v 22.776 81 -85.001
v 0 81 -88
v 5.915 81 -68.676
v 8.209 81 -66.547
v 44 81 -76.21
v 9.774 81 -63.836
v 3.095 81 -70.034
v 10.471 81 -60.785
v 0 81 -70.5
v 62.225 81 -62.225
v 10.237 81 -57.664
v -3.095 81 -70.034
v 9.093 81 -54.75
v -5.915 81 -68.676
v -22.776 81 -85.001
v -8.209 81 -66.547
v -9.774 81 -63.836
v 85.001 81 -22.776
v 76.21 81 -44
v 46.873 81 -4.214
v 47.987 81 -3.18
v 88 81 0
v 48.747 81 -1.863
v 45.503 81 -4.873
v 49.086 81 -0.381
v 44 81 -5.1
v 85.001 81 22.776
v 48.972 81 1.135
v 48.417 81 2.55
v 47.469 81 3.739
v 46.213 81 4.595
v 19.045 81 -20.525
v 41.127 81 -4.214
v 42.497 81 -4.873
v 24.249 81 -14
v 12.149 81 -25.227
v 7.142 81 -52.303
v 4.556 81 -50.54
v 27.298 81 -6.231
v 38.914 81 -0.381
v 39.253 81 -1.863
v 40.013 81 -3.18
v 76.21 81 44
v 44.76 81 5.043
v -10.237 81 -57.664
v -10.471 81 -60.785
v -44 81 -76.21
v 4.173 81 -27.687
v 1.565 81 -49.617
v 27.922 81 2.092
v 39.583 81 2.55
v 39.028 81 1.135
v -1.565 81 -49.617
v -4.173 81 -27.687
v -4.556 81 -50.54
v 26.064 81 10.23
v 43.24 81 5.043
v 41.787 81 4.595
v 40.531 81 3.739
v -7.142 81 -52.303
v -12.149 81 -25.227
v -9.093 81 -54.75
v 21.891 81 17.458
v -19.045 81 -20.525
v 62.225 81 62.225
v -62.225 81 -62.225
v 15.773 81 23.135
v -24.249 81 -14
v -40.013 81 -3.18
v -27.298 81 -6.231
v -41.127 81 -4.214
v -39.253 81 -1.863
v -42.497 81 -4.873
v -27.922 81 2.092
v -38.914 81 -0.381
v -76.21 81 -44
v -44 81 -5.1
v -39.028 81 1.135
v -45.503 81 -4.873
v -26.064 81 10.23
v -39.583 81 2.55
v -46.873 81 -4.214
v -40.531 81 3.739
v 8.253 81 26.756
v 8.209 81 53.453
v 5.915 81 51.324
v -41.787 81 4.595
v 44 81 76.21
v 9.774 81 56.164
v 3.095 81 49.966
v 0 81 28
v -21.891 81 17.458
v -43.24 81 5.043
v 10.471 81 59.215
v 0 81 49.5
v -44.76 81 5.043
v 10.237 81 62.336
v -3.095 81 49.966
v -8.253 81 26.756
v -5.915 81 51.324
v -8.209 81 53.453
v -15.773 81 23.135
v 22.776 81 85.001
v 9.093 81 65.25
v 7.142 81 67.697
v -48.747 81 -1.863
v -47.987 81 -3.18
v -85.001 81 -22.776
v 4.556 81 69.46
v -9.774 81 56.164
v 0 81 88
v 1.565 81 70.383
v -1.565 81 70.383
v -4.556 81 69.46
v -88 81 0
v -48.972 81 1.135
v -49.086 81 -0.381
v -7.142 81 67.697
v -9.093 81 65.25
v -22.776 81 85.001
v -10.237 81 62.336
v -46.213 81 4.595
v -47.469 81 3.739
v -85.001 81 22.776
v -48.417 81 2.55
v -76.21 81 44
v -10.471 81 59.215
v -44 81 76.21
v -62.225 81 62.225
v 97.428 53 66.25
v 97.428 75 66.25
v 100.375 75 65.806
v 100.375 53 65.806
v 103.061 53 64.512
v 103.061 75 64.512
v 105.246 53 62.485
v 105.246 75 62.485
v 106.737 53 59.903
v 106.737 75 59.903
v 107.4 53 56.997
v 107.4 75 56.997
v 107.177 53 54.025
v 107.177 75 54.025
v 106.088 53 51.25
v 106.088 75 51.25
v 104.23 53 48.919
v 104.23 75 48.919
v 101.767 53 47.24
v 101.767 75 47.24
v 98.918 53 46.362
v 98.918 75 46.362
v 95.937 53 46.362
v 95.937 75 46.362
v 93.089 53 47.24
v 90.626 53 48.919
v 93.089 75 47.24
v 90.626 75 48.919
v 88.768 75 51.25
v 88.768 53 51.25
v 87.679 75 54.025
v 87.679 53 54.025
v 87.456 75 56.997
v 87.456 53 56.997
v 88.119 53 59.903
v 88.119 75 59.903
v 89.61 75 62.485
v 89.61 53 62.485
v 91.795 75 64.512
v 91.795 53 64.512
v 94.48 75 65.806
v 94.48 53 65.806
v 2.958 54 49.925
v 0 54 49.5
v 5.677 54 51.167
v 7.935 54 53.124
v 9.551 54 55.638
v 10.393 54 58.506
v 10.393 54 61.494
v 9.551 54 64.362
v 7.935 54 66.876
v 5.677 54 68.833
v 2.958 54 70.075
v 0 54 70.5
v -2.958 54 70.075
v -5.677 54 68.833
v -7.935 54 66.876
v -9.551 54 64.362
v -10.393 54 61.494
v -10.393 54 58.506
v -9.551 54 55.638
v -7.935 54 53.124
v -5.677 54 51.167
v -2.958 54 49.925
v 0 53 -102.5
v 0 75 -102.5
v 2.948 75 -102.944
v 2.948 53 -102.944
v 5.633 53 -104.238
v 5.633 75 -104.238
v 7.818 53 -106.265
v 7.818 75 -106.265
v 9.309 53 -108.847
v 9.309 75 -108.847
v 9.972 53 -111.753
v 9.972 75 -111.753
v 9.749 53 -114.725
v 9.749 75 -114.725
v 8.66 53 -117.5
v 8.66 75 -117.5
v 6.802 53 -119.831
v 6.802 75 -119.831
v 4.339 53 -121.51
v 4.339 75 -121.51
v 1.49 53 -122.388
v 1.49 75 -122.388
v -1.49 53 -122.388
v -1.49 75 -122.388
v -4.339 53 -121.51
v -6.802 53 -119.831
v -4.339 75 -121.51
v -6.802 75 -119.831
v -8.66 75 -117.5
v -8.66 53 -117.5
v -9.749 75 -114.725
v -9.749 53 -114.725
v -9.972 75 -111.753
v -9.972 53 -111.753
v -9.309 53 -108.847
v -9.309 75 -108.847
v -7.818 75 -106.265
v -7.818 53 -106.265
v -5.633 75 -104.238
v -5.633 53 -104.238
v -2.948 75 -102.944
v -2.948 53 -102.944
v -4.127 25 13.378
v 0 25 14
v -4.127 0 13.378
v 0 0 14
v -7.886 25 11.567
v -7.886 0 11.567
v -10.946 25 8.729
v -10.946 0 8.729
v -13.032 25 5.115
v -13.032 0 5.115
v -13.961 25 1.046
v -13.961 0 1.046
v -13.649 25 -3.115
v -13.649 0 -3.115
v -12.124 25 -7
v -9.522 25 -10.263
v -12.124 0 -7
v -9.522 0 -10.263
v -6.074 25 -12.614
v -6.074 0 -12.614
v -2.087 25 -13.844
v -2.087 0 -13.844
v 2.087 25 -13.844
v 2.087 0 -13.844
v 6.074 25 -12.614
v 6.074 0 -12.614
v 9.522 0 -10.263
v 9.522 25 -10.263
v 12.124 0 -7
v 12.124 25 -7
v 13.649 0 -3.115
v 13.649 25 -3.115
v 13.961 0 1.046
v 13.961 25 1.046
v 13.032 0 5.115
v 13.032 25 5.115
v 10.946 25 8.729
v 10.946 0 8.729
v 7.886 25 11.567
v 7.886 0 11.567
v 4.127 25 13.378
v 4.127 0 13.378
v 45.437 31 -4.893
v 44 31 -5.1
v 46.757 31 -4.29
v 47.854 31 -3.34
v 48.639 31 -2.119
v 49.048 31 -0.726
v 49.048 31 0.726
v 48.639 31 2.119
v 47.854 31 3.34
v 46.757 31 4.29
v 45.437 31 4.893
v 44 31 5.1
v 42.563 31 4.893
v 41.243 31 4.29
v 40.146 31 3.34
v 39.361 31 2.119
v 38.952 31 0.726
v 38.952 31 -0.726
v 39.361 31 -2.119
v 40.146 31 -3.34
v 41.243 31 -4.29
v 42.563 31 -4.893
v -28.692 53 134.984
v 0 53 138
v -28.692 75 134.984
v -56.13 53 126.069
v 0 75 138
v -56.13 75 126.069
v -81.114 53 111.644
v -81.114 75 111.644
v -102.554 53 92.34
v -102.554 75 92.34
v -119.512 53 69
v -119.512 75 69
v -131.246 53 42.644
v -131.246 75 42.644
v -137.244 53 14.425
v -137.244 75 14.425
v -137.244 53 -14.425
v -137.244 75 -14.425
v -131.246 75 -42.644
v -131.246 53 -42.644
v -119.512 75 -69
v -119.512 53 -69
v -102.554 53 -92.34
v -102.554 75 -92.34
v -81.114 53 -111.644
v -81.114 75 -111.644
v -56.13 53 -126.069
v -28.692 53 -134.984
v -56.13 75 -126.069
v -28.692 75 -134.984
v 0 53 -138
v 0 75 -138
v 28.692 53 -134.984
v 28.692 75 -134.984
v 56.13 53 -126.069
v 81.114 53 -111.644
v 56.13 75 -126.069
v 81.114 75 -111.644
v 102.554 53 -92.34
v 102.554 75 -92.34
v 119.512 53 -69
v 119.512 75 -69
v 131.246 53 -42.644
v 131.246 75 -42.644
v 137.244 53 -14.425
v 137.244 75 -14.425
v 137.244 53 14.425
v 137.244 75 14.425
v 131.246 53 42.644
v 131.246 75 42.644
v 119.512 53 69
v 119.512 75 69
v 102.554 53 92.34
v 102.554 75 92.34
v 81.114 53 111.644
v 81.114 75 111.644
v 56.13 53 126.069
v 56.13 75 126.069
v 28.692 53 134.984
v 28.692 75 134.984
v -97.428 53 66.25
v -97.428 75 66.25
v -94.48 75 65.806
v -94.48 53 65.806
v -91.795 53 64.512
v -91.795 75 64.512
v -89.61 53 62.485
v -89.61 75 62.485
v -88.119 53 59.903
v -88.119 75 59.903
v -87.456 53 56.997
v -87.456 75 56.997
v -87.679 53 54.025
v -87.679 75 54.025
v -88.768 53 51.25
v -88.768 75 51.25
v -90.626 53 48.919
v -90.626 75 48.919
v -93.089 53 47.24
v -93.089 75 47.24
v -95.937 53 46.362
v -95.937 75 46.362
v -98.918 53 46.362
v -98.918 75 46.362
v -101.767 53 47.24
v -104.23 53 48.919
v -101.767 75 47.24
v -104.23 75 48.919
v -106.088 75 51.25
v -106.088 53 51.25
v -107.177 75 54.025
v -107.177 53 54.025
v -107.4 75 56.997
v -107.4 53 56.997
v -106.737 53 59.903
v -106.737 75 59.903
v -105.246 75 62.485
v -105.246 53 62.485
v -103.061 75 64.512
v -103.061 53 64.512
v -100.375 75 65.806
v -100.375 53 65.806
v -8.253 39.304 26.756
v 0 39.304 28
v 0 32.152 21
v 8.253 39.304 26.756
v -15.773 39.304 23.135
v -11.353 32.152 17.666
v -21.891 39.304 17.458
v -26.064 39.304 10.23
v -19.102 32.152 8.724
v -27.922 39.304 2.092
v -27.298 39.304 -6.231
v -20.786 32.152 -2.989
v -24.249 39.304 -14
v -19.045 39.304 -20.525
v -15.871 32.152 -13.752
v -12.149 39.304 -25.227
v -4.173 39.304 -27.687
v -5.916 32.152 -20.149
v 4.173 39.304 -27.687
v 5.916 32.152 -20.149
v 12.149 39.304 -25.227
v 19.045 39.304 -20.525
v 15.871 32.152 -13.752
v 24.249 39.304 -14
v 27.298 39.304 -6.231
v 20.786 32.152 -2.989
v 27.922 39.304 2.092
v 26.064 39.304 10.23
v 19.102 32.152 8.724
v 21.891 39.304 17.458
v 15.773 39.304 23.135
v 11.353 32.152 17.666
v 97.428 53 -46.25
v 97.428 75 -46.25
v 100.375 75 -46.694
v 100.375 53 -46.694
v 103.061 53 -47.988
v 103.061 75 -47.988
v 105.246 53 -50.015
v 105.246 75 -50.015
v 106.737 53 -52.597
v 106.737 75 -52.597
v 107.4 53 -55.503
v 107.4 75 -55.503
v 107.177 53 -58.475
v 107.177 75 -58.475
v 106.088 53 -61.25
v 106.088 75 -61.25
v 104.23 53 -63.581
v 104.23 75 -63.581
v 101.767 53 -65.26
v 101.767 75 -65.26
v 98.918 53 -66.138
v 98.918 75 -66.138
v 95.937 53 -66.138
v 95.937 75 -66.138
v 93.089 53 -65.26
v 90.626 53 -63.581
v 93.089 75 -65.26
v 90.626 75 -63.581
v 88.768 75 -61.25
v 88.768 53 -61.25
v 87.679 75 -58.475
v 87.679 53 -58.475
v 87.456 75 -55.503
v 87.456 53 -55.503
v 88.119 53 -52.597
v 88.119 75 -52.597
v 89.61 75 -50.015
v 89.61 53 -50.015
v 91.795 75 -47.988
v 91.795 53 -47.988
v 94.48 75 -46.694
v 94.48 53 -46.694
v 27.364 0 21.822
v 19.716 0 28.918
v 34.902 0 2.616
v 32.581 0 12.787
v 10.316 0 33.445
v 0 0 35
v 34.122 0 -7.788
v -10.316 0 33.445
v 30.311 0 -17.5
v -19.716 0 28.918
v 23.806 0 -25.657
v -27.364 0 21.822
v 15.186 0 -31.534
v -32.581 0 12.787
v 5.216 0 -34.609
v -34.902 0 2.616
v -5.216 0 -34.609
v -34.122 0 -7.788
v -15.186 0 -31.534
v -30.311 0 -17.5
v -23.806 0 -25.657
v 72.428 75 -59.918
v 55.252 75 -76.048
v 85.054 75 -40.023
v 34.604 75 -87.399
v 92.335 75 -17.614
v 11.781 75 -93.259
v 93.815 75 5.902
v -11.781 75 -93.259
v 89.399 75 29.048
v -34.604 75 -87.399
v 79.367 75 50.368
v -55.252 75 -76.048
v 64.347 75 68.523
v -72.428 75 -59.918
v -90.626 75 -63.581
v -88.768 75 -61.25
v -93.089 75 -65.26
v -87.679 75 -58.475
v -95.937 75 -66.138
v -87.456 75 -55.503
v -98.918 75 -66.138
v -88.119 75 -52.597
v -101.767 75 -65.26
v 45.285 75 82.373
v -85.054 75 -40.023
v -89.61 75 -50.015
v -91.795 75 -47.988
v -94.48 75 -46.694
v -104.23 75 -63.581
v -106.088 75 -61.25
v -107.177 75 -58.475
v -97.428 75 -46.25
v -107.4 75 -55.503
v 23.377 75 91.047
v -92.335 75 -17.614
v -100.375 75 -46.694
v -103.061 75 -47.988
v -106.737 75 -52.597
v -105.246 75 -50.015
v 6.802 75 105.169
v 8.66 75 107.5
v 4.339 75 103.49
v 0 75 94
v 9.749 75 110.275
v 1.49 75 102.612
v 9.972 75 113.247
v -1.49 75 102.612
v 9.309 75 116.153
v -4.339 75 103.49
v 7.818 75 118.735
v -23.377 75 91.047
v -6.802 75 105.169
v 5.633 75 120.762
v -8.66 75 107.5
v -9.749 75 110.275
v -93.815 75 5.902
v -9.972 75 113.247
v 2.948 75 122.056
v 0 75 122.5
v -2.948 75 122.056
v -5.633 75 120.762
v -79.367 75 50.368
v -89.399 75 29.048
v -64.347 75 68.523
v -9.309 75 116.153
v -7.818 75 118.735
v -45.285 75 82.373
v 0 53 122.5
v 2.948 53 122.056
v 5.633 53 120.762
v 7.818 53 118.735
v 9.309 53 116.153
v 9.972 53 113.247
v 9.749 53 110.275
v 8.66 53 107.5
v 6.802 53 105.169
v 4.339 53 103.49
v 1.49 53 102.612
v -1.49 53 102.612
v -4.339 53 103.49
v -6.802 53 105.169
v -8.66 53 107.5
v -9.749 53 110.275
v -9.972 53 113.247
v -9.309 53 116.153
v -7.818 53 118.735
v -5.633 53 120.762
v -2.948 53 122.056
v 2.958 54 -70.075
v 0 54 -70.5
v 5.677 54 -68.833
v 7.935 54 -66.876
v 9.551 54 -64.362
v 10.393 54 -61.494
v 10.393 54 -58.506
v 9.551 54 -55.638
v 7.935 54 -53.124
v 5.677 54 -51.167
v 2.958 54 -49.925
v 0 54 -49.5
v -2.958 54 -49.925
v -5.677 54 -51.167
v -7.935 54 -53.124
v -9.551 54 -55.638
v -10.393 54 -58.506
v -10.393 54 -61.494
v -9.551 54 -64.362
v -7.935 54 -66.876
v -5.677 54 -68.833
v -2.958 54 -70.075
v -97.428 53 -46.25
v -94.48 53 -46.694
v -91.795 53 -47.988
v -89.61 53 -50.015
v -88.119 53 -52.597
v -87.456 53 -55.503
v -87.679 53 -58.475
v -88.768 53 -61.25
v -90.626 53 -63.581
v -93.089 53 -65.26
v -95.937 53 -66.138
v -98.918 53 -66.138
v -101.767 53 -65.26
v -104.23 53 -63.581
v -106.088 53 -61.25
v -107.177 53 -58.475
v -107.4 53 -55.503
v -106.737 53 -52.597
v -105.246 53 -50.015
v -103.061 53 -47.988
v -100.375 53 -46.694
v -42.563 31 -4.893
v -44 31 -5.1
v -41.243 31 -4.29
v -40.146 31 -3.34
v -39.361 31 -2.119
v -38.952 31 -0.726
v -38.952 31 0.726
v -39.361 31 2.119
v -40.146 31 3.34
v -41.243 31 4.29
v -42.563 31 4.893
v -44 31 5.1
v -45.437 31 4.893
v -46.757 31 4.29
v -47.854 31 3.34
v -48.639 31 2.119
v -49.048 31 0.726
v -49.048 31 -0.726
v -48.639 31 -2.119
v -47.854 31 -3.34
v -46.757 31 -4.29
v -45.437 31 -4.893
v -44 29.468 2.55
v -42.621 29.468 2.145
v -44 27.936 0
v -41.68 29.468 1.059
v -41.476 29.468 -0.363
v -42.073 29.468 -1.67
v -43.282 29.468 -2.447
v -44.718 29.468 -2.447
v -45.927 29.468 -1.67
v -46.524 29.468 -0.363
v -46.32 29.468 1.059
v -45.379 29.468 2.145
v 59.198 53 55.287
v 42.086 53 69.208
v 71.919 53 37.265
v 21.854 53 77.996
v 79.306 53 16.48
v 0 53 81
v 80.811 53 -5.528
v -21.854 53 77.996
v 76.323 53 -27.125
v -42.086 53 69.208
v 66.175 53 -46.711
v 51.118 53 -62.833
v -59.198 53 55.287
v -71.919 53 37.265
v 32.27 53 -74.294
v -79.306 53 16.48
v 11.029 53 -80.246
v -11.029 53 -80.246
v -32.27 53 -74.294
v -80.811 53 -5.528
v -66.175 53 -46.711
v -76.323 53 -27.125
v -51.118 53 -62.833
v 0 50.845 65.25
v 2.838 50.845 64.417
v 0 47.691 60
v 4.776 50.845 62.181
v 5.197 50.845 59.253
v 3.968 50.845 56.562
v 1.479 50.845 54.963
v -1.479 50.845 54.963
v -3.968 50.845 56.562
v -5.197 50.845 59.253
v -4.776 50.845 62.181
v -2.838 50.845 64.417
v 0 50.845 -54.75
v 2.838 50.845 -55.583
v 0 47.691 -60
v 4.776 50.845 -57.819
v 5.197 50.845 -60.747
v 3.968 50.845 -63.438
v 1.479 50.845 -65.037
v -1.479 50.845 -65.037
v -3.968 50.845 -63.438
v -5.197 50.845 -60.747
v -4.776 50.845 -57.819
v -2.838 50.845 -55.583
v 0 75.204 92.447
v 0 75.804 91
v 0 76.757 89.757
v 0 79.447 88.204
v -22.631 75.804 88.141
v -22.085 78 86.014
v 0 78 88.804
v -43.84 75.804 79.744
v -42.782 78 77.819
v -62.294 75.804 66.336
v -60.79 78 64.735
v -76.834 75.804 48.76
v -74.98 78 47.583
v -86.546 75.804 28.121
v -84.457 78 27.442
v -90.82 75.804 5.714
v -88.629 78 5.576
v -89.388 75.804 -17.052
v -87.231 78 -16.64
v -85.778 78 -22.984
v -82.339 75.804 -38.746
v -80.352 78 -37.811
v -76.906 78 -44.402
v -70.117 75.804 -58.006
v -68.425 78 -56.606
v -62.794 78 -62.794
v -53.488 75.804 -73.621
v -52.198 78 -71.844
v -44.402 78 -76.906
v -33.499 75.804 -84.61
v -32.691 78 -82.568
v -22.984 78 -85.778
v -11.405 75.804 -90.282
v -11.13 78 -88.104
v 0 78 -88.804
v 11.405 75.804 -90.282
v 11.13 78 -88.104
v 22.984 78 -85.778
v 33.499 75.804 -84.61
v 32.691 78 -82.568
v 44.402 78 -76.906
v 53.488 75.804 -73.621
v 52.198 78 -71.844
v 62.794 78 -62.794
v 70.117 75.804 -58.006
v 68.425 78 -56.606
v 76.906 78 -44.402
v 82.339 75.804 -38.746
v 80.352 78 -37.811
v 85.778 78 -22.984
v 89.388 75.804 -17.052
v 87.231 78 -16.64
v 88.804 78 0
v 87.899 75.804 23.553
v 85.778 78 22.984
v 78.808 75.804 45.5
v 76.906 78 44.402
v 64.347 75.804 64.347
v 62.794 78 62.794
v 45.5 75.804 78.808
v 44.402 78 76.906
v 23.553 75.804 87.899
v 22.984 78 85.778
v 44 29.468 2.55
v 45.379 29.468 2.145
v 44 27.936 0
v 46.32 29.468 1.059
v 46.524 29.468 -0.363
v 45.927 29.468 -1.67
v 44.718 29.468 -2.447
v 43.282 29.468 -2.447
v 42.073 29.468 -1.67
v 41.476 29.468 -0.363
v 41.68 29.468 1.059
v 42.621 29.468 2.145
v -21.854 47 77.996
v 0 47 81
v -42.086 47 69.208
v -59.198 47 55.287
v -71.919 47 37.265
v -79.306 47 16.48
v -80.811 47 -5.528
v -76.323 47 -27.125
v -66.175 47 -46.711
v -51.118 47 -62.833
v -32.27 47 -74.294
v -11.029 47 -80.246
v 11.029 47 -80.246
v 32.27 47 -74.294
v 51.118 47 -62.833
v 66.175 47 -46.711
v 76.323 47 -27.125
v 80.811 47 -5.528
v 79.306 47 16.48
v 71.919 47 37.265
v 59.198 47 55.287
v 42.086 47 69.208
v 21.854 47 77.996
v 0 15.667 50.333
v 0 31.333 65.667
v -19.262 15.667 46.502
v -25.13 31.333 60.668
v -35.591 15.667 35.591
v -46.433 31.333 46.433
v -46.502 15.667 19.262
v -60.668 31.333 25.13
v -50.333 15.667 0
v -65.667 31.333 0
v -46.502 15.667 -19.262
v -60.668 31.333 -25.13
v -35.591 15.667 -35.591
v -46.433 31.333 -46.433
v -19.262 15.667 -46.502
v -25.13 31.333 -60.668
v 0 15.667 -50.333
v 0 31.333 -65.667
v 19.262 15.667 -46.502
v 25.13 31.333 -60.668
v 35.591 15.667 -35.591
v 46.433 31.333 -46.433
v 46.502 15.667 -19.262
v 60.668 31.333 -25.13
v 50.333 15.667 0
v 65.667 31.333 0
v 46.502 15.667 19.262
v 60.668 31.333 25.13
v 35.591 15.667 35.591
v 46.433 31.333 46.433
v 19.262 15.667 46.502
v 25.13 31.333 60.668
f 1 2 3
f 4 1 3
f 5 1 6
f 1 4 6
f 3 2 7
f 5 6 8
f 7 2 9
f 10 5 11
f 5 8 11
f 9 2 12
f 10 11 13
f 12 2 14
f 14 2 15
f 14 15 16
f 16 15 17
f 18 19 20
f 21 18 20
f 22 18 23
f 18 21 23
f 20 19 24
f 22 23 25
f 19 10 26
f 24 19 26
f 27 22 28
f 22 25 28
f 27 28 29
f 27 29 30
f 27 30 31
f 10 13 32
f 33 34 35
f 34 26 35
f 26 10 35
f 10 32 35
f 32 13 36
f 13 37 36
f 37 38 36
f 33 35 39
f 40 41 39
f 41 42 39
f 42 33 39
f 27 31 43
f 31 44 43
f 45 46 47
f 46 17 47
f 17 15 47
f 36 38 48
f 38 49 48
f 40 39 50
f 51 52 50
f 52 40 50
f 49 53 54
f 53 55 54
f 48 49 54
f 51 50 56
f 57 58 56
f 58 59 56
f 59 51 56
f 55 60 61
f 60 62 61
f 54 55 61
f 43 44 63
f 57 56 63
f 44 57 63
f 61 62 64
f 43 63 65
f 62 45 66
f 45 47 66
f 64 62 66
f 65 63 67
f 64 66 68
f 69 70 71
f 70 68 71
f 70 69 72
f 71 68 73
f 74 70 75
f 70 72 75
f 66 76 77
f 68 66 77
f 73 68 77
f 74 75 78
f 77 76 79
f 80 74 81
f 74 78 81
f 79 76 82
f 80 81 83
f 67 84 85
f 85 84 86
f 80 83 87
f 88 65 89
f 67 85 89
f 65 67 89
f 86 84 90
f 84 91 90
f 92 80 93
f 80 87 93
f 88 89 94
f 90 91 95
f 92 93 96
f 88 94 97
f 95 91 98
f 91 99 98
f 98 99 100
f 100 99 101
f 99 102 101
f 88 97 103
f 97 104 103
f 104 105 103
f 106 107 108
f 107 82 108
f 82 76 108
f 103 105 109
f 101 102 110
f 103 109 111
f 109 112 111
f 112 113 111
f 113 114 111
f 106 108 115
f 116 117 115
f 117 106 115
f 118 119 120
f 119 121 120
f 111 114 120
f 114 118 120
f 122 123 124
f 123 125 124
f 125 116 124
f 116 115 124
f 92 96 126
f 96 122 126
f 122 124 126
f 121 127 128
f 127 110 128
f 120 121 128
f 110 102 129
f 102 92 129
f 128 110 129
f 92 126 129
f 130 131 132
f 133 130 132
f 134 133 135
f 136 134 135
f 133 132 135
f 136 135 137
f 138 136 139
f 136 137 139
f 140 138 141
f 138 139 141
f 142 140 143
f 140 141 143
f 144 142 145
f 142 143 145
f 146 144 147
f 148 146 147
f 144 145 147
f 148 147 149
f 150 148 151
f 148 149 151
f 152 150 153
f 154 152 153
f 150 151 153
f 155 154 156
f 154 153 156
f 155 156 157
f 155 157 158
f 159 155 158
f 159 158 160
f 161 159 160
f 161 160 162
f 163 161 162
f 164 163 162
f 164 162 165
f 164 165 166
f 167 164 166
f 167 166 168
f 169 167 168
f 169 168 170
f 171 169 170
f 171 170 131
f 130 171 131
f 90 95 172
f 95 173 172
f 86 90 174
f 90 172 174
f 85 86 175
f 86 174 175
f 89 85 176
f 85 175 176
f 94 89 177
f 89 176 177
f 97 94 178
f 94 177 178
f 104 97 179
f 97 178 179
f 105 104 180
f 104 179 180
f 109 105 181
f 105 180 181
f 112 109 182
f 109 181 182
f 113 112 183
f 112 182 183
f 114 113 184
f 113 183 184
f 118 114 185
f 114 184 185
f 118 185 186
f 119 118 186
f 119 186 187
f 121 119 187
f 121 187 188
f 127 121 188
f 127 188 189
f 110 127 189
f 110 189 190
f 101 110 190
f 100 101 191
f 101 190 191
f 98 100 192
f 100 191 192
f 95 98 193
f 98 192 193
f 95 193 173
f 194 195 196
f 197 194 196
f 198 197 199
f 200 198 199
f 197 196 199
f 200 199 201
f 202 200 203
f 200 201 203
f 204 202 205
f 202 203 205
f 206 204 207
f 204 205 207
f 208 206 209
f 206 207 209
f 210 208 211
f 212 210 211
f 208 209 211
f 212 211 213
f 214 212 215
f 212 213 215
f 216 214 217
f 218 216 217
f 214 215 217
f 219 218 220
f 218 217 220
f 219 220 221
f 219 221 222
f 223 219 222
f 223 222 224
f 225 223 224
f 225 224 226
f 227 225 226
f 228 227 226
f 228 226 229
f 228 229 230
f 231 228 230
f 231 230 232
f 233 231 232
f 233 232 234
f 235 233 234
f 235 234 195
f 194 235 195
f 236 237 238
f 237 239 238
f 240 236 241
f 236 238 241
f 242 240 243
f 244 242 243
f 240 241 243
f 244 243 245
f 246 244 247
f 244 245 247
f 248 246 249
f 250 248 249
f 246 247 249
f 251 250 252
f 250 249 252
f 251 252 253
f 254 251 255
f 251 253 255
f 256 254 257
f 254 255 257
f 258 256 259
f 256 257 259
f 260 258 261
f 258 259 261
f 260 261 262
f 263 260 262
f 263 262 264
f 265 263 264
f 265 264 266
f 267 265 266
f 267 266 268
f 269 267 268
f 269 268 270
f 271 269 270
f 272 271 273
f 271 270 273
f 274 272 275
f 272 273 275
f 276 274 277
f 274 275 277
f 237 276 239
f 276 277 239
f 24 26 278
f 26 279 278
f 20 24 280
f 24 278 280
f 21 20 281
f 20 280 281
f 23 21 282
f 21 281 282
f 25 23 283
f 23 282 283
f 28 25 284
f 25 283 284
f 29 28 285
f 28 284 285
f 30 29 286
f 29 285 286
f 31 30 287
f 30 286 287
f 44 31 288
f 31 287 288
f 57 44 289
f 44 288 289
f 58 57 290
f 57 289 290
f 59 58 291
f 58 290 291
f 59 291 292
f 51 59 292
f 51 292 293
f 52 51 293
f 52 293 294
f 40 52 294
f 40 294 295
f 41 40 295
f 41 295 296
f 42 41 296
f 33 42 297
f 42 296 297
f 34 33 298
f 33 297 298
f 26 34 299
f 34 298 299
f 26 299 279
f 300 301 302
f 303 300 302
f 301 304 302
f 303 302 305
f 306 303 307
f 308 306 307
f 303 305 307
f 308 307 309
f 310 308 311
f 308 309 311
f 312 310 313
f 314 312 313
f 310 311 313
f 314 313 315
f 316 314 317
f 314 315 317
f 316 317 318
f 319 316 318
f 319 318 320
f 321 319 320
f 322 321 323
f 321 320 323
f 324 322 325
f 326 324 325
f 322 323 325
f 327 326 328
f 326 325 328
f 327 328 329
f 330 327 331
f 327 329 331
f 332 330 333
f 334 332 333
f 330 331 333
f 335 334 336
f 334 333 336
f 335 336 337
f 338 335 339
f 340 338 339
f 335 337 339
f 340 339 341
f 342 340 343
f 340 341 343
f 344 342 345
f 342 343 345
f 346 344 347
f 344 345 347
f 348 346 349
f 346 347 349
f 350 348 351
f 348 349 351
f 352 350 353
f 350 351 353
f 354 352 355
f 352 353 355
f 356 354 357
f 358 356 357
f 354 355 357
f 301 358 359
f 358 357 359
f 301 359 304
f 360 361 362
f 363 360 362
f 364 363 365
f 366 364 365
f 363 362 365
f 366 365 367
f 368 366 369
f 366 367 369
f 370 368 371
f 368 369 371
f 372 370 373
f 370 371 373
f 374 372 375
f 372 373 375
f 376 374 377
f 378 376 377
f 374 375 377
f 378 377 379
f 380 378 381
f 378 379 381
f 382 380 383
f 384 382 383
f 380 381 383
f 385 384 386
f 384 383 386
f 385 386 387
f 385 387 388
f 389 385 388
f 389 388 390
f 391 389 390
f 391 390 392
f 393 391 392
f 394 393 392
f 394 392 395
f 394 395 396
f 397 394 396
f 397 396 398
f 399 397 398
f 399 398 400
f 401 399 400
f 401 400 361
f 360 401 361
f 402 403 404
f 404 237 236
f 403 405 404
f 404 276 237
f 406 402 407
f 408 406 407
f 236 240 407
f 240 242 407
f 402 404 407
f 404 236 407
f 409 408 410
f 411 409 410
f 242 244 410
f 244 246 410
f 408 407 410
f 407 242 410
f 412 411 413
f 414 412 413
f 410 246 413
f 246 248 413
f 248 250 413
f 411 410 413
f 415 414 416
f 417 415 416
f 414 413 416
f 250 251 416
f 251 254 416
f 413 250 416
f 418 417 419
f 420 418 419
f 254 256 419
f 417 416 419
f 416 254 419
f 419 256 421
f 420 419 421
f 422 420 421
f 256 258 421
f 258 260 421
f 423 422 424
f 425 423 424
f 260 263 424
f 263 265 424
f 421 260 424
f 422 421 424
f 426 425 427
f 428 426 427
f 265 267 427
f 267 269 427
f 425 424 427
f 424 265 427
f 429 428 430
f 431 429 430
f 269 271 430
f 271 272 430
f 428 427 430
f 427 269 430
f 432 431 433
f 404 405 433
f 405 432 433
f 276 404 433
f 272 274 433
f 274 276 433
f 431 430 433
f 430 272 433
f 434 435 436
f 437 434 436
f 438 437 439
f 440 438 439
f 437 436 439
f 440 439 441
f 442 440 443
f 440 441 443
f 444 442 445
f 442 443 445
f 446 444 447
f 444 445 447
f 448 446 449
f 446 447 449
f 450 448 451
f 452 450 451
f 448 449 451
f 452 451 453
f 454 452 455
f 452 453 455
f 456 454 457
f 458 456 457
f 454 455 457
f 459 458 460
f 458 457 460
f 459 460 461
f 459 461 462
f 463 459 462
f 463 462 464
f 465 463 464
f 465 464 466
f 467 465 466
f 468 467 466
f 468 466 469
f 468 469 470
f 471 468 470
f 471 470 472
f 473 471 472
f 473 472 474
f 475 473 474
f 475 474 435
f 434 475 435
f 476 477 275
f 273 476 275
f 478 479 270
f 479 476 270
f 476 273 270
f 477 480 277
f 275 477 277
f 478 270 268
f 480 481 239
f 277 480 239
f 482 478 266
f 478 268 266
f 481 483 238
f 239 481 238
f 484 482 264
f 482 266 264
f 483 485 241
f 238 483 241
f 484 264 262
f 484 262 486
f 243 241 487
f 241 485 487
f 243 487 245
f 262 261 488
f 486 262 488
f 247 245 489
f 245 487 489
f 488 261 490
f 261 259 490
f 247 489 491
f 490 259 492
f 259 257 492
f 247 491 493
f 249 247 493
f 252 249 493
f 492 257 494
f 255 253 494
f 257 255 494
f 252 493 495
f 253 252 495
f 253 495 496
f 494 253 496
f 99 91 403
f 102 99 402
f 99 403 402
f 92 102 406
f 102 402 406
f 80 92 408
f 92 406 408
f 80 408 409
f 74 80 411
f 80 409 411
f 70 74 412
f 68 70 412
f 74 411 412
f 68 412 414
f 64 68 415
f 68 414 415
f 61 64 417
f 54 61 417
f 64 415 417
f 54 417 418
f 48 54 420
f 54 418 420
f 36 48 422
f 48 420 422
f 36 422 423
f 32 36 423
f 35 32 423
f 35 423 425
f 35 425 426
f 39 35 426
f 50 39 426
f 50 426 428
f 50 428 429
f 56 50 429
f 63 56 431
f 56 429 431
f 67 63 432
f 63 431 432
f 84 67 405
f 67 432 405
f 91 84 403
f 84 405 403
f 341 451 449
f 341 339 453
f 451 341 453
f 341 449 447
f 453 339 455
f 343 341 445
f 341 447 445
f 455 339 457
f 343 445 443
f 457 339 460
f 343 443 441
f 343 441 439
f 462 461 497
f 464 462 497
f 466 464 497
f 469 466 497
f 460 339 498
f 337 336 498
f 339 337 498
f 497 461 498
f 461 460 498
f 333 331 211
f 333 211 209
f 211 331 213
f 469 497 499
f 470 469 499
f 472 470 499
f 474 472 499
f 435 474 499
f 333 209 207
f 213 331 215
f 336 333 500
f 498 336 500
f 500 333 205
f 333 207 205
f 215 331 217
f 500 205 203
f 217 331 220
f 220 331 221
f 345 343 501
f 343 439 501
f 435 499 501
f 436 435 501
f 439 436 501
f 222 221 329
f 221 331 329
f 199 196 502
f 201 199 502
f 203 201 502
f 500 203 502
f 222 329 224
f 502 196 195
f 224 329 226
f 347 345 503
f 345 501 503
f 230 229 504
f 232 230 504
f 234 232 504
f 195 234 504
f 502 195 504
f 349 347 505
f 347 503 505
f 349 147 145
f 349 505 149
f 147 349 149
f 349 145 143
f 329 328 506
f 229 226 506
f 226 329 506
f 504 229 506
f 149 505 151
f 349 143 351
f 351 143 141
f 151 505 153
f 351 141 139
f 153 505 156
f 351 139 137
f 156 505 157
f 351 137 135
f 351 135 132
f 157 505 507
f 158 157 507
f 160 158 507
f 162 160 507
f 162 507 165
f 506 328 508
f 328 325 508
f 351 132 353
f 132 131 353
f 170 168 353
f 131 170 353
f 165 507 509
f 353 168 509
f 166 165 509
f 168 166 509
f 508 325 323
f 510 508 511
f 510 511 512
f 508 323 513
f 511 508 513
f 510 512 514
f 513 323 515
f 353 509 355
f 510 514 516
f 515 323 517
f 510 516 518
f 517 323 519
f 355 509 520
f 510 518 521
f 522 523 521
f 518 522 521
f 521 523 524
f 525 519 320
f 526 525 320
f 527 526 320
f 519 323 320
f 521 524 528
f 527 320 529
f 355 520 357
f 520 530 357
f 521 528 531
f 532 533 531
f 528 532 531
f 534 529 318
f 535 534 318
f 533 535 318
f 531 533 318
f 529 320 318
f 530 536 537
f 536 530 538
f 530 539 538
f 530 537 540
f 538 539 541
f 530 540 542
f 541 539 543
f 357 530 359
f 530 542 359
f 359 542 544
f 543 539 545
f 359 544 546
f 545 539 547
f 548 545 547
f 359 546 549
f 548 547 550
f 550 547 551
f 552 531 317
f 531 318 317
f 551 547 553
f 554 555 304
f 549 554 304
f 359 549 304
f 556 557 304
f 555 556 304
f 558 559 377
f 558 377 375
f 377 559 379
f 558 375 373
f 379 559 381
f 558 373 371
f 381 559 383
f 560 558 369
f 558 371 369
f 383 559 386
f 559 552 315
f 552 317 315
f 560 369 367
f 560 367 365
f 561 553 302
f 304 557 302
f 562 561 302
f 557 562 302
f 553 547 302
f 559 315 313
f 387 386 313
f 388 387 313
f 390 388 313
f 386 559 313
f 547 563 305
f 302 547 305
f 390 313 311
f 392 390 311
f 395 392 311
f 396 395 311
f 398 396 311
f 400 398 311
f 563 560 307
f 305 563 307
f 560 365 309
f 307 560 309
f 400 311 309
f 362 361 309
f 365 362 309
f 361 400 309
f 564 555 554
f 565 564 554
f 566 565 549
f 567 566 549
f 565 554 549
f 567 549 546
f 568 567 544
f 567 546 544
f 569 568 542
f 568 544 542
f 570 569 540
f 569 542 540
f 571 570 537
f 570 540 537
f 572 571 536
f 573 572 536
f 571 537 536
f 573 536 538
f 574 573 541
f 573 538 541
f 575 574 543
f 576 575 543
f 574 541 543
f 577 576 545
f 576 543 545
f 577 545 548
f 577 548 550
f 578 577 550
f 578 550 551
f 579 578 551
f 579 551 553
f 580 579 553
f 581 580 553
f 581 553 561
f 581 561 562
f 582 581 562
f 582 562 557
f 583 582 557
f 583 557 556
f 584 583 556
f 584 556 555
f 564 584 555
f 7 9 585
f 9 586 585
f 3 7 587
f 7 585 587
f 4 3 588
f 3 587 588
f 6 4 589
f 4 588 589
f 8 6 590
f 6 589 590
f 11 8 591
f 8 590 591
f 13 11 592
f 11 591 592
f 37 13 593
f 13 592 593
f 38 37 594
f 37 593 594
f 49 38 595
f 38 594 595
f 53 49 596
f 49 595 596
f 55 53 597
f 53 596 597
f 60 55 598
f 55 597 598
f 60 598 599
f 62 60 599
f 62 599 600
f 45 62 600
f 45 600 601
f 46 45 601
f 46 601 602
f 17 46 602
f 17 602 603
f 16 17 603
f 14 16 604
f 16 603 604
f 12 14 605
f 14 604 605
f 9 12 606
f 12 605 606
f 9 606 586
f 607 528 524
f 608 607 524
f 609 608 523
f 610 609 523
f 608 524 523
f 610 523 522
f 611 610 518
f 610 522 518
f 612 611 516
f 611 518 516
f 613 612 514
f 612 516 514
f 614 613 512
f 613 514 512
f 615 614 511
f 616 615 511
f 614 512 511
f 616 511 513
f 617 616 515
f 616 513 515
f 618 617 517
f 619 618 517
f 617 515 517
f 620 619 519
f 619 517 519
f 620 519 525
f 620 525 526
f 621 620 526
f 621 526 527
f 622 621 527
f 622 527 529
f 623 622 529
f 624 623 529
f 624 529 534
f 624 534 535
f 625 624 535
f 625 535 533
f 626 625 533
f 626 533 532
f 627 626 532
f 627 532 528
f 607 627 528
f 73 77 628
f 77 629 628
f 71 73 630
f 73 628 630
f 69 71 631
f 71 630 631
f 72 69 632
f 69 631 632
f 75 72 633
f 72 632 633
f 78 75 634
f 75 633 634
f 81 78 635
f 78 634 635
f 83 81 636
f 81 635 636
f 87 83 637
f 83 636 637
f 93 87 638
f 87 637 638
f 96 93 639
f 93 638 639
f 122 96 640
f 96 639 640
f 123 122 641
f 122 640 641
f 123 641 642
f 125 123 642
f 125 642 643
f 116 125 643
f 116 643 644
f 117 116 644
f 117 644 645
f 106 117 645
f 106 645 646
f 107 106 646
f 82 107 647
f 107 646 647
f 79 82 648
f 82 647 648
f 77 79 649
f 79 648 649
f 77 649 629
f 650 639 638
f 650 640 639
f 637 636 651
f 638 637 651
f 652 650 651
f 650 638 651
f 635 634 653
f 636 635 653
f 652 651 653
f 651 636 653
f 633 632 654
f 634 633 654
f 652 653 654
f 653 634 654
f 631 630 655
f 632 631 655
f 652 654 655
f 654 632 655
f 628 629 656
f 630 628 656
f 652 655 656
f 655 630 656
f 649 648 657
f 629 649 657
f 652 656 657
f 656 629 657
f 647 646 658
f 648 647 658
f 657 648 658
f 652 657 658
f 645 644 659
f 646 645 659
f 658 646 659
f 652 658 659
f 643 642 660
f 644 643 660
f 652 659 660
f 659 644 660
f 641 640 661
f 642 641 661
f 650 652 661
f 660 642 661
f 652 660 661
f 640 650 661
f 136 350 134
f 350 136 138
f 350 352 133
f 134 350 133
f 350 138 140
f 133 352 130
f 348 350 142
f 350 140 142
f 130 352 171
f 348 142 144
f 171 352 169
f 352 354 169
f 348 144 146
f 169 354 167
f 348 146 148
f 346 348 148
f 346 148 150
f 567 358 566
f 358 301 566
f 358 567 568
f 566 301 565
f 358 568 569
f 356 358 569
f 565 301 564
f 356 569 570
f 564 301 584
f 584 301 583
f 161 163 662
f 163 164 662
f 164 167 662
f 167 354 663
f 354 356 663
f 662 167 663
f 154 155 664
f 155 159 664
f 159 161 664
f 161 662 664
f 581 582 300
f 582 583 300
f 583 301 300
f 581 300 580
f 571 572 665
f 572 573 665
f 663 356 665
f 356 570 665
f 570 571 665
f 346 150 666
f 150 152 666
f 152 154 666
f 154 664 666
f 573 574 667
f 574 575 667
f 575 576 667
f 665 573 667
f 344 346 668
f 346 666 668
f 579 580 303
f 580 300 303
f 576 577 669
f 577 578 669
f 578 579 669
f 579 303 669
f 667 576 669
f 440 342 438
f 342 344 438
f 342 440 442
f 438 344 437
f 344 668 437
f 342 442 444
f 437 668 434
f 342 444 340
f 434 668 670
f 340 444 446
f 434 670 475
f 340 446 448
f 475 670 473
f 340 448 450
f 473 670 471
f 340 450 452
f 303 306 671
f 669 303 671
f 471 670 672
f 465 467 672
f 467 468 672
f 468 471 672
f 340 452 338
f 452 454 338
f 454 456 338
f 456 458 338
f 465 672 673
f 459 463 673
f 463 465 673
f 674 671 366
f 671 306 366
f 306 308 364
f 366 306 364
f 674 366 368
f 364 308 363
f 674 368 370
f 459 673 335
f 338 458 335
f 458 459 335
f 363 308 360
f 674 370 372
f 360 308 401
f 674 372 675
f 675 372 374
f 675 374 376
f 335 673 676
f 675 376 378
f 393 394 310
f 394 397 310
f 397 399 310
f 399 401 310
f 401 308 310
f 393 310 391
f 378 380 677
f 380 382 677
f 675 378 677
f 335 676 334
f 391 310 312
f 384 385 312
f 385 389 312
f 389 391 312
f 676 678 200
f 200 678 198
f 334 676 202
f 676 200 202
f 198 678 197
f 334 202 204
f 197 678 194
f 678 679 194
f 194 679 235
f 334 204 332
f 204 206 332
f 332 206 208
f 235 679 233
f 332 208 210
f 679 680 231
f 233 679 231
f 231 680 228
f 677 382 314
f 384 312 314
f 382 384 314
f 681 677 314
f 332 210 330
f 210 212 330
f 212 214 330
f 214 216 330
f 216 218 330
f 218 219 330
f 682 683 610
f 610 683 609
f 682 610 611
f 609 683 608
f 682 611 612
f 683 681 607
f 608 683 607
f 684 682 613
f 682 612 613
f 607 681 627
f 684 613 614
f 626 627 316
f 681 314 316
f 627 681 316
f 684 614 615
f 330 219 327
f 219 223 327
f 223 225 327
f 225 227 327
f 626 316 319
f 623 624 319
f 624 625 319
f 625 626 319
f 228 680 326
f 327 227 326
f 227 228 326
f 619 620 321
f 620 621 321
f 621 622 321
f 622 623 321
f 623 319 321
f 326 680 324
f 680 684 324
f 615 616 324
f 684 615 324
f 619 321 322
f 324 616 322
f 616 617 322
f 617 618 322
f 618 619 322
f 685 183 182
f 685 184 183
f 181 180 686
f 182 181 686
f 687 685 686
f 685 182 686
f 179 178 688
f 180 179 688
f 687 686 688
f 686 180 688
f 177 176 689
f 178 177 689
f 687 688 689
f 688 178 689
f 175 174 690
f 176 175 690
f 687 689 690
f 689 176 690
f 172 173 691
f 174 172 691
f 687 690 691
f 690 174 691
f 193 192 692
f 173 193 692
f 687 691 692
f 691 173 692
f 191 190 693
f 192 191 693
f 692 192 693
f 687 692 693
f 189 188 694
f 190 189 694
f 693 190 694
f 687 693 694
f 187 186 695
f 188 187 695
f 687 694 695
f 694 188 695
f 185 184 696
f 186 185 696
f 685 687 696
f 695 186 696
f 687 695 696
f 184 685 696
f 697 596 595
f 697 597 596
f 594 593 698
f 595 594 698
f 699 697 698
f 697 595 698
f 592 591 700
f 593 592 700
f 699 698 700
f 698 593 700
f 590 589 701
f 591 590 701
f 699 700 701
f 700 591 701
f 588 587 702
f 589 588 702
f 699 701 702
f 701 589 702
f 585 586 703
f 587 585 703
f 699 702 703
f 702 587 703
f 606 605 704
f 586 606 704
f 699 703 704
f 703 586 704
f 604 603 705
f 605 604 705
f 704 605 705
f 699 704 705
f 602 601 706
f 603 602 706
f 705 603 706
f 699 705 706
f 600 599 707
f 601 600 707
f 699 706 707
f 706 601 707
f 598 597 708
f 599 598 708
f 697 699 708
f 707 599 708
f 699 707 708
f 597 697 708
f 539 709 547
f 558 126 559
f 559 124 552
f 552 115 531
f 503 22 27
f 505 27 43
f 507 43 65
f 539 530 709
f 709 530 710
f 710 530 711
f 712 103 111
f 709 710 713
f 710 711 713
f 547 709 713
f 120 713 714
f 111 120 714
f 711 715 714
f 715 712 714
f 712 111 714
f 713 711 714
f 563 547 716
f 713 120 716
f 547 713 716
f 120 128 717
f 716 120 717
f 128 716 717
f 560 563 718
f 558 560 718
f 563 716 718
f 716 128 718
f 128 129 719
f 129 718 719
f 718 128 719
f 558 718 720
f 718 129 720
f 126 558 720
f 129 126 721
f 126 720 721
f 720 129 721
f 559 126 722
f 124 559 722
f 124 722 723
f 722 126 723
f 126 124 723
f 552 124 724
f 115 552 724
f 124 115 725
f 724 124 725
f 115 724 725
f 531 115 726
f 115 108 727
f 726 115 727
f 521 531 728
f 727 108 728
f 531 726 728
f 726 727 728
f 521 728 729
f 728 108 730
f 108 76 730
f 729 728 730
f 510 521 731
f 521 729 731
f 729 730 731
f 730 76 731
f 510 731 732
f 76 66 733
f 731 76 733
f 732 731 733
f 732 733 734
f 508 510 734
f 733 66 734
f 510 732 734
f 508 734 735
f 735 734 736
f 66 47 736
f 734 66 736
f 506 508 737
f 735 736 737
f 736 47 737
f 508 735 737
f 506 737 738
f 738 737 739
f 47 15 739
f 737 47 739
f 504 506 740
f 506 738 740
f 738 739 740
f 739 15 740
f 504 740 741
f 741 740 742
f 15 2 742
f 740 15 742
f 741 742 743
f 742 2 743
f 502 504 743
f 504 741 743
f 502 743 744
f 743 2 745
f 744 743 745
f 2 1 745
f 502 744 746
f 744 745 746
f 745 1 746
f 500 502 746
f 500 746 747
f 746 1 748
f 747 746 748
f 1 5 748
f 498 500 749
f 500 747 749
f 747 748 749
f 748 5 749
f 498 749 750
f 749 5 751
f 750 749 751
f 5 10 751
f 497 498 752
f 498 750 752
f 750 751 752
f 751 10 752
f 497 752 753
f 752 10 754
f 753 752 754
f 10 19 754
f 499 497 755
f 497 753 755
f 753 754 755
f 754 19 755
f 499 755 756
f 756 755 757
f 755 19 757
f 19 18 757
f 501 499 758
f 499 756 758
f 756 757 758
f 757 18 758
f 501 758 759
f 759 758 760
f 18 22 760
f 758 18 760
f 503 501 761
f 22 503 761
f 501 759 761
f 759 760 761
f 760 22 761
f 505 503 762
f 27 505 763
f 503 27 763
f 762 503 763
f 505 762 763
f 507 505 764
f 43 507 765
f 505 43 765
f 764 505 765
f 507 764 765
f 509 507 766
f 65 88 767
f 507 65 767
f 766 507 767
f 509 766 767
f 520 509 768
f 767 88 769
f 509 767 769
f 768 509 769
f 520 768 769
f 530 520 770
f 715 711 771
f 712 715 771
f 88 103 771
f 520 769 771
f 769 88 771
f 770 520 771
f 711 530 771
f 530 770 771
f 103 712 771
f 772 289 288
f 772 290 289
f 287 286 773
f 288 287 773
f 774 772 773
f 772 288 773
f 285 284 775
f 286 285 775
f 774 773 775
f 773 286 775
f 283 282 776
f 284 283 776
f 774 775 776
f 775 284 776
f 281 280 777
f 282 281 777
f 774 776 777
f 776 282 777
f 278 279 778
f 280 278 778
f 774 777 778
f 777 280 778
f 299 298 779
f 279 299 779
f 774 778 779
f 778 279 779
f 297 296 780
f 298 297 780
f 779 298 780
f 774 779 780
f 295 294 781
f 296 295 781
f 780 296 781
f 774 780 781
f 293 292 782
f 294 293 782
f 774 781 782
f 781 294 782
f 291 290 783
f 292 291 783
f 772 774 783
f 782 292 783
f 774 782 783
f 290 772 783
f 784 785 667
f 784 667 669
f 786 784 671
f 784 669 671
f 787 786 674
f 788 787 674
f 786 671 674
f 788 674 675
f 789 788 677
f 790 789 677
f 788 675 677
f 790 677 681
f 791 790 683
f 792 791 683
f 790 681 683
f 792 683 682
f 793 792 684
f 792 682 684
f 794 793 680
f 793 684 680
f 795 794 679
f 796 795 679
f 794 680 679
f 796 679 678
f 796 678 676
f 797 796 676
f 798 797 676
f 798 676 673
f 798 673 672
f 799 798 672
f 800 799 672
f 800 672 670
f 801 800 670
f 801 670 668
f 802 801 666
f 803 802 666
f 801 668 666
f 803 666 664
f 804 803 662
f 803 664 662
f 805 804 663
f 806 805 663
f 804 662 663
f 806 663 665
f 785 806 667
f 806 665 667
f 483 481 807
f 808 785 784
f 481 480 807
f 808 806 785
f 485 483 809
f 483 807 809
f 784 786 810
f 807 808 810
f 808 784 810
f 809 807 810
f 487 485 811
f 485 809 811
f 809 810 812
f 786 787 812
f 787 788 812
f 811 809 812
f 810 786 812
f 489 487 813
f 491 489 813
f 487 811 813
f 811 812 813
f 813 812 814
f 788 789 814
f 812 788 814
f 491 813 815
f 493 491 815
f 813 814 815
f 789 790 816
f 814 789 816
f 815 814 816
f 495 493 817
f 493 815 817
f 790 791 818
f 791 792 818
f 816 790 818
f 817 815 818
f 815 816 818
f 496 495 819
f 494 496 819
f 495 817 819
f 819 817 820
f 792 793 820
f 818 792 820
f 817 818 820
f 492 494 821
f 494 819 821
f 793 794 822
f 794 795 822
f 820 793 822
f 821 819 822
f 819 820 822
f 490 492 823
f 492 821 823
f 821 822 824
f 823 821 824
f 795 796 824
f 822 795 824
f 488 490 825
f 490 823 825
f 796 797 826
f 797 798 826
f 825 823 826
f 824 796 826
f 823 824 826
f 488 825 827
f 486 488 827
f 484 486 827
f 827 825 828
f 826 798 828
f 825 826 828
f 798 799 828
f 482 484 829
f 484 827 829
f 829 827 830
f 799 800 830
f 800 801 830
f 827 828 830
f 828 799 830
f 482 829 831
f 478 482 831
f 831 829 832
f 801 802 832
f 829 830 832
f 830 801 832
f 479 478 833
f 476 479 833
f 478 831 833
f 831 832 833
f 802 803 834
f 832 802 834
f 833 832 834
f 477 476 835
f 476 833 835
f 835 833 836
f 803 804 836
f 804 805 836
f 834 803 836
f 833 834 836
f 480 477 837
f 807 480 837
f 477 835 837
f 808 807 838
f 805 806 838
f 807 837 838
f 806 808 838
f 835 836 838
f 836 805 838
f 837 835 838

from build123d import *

# Parameters (mm, degrees)
CUT_EXTRUDE1_REACH     = 211.077
SKETCH2_R              = 10
M24_TAPPED_HOLE1_D     = 21
M24_TAPPED_HOLE1_DEPTH = 27
M24_TAPPED_HOLE1_TIP   = 6.3090365
M12_TAPPED_HOLE1_D     = 10.2
M12_TAPPED_HOLE1_DEPTH = 50
M12_TAPPED_HOLE1_TIP   = 3.064389157


with BuildPart() as part:
    # Sketch1 → Revolve1 (revolve)
    with BuildSketch(Plane(origin=(0, 0, 0), x_dir=(0, 0, -1), z_dir=(1, 0, 0)), mode=Mode.PRIVATE) as revolve1_sk:
        with BuildLine():
            Line((14, 0), (35, 0))
            Line((35, 0), (81, 47))
            Line((81, 47), (81, 53))
            Line((81, 53), (138, 53))
            Line((138, 53), (138, 75))
            Line((138, 75), (94, 75))
            ThreePointArc((94, 75), (89.757359313, 76.757359313), (88, 81))
            Line((88, 81), (28, 81))
            Line((28, 81), (28, 39.304347826))
            Line((28, 39.304347826), (14, 25))
            Line((14, 25), (14, 0))
        make_face()
    revolve(revolve1_sk.sketch.rotate(Axis((0, 28, 0), (0, -1, 0)), 180), axis=Axis((0, 28, 0), (0, -1, 0)))

    # Sketch2 → Cut-Extrude1 (cut, up to next)
    with BuildSketch(Plane(origin=(0, 75, 0), x_dir=(1, 0, 0), z_dir=(0, 1, 0)), mode=Mode.PRIVATE) as cut_extrude1_sk1:
        with Locations(Location((0, 112.5, 0), (0, 0, 270))):
            Circle(SKETCH2_R)
    cut_extrude1_tool1 = extrude(cut_extrude1_sk1.sketch, amount=-CUT_EXTRUDE1_REACH, mode=Mode.PRIVATE) & part.part
    # Sketch2 → Cut-Extrude1 (cut, up to next)
    with BuildSketch(Plane(origin=(0, 75, 0), x_dir=(1, 0, 0), z_dir=(0, 1, 0)), mode=Mode.PRIVATE) as cut_extrude1_sk2:
        with Locations(Location((97.427857926, 56.25, 0), (0, 0, 270))):
            Circle(SKETCH2_R)
    cut_extrude1_tool2 = extrude(cut_extrude1_sk2.sketch, amount=-CUT_EXTRUDE1_REACH, mode=Mode.PRIVATE) & part.part
    # Sketch2 → Cut-Extrude1 (cut, up to next)
    with BuildSketch(Plane(origin=(0, 75, 0), x_dir=(1, 0, 0), z_dir=(0, 1, 0)), mode=Mode.PRIVATE) as cut_extrude1_sk3:
        with Locations(Location((97.427857926, -56.25, 0), (0, 0, 270))):
            Circle(SKETCH2_R)
    cut_extrude1_tool3 = extrude(cut_extrude1_sk3.sketch, amount=-CUT_EXTRUDE1_REACH, mode=Mode.PRIVATE) & part.part
    # Sketch2 → Cut-Extrude1 (cut, up to next)
    with BuildSketch(Plane(origin=(0, 75, 0), x_dir=(1, 0, 0), z_dir=(0, 1, 0)), mode=Mode.PRIVATE) as cut_extrude1_sk4:
        with Locations(Location((0, -112.5, 0), (0, 0, 270))):
            Circle(SKETCH2_R)
    cut_extrude1_tool4 = extrude(cut_extrude1_sk4.sketch, amount=-CUT_EXTRUDE1_REACH, mode=Mode.PRIVATE) & part.part
    # Sketch2 → Cut-Extrude1 (cut, up to next)
    with BuildSketch(Plane(origin=(0, 75, 0), x_dir=(1, 0, 0), z_dir=(0, 1, 0)), mode=Mode.PRIVATE) as cut_extrude1_sk5:
        with Locations(Location((-97.427857926, -56.25, 0), (0, 0, 270))):
            Circle(SKETCH2_R)
    cut_extrude1_tool5 = extrude(cut_extrude1_sk5.sketch, amount=-CUT_EXTRUDE1_REACH, mode=Mode.PRIVATE) & part.part
    # Sketch2 → Cut-Extrude1 (cut, up to next)
    with BuildSketch(Plane(origin=(0, 75, 0), x_dir=(1, 0, 0), z_dir=(0, 1, 0)), mode=Mode.PRIVATE) as cut_extrude1_sk6:
        with Locations(Location((-97.427857926, 56.25, 0), (0, 0, 270))):
            Circle(SKETCH2_R)
    cut_extrude1_tool6 = extrude(cut_extrude1_sk6.sketch, amount=-CUT_EXTRUDE1_REACH, mode=Mode.PRIVATE) & part.part
    add(cut_extrude1_tool1.solids().sort_by_distance((0, 75, -112.5))[0], mode=Mode.SUBTRACT)
    add(cut_extrude1_tool2.solids().sort_by_distance((97.427858, 75, -56.25))[0], mode=Mode.SUBTRACT)
    add(cut_extrude1_tool3.solids().sort_by_distance((97.427858, 75, 56.25))[0], mode=Mode.SUBTRACT)
    add(cut_extrude1_tool4.solids().sort_by_distance((0, 75, 112.5))[0], mode=Mode.SUBTRACT)
    add(cut_extrude1_tool5.solids().sort_by_distance((-97.427858, 75, 56.25))[0], mode=Mode.SUBTRACT)
    add(cut_extrude1_tool6.solids().sort_by_distance((-97.427858, 75, -56.25))[0], mode=Mode.SUBTRACT)

    # M24 Tapped Hole1
    with Locations(Plane(origin=(0, 81, -60), x_dir=(0, 0, 1), z_dir=(0, 1, 0))):
        with Locations((0, 0), (120, 0)):
            Hole(M24_TAPPED_HOLE1_D / 2, depth=M24_TAPPED_HOLE1_DEPTH)
            with Locations((0, 0, -(M24_TAPPED_HOLE1_DEPTH + M24_TAPPED_HOLE1_TIP / 2))):  # 118° drill point
                Cone(0, M24_TAPPED_HOLE1_D / 2, M24_TAPPED_HOLE1_TIP, mode=Mode.SUBTRACT)

    # M12 Tapped Hole1
    with Locations(Plane(origin=(44, 81, 0), x_dir=(0, 0, 1), z_dir=(0, 1, 0))):
        with Locations((0, 0), (0, -88)):
            Hole(M12_TAPPED_HOLE1_D / 2, depth=M12_TAPPED_HOLE1_DEPTH)
            with Locations((0, 0, -(M12_TAPPED_HOLE1_DEPTH + M12_TAPPED_HOLE1_TIP / 2))):  # 118° drill point
                Cone(0, M12_TAPPED_HOLE1_D / 2, M12_TAPPED_HOLE1_TIP, mode=Mode.SUBTRACT)


solid = part.part
